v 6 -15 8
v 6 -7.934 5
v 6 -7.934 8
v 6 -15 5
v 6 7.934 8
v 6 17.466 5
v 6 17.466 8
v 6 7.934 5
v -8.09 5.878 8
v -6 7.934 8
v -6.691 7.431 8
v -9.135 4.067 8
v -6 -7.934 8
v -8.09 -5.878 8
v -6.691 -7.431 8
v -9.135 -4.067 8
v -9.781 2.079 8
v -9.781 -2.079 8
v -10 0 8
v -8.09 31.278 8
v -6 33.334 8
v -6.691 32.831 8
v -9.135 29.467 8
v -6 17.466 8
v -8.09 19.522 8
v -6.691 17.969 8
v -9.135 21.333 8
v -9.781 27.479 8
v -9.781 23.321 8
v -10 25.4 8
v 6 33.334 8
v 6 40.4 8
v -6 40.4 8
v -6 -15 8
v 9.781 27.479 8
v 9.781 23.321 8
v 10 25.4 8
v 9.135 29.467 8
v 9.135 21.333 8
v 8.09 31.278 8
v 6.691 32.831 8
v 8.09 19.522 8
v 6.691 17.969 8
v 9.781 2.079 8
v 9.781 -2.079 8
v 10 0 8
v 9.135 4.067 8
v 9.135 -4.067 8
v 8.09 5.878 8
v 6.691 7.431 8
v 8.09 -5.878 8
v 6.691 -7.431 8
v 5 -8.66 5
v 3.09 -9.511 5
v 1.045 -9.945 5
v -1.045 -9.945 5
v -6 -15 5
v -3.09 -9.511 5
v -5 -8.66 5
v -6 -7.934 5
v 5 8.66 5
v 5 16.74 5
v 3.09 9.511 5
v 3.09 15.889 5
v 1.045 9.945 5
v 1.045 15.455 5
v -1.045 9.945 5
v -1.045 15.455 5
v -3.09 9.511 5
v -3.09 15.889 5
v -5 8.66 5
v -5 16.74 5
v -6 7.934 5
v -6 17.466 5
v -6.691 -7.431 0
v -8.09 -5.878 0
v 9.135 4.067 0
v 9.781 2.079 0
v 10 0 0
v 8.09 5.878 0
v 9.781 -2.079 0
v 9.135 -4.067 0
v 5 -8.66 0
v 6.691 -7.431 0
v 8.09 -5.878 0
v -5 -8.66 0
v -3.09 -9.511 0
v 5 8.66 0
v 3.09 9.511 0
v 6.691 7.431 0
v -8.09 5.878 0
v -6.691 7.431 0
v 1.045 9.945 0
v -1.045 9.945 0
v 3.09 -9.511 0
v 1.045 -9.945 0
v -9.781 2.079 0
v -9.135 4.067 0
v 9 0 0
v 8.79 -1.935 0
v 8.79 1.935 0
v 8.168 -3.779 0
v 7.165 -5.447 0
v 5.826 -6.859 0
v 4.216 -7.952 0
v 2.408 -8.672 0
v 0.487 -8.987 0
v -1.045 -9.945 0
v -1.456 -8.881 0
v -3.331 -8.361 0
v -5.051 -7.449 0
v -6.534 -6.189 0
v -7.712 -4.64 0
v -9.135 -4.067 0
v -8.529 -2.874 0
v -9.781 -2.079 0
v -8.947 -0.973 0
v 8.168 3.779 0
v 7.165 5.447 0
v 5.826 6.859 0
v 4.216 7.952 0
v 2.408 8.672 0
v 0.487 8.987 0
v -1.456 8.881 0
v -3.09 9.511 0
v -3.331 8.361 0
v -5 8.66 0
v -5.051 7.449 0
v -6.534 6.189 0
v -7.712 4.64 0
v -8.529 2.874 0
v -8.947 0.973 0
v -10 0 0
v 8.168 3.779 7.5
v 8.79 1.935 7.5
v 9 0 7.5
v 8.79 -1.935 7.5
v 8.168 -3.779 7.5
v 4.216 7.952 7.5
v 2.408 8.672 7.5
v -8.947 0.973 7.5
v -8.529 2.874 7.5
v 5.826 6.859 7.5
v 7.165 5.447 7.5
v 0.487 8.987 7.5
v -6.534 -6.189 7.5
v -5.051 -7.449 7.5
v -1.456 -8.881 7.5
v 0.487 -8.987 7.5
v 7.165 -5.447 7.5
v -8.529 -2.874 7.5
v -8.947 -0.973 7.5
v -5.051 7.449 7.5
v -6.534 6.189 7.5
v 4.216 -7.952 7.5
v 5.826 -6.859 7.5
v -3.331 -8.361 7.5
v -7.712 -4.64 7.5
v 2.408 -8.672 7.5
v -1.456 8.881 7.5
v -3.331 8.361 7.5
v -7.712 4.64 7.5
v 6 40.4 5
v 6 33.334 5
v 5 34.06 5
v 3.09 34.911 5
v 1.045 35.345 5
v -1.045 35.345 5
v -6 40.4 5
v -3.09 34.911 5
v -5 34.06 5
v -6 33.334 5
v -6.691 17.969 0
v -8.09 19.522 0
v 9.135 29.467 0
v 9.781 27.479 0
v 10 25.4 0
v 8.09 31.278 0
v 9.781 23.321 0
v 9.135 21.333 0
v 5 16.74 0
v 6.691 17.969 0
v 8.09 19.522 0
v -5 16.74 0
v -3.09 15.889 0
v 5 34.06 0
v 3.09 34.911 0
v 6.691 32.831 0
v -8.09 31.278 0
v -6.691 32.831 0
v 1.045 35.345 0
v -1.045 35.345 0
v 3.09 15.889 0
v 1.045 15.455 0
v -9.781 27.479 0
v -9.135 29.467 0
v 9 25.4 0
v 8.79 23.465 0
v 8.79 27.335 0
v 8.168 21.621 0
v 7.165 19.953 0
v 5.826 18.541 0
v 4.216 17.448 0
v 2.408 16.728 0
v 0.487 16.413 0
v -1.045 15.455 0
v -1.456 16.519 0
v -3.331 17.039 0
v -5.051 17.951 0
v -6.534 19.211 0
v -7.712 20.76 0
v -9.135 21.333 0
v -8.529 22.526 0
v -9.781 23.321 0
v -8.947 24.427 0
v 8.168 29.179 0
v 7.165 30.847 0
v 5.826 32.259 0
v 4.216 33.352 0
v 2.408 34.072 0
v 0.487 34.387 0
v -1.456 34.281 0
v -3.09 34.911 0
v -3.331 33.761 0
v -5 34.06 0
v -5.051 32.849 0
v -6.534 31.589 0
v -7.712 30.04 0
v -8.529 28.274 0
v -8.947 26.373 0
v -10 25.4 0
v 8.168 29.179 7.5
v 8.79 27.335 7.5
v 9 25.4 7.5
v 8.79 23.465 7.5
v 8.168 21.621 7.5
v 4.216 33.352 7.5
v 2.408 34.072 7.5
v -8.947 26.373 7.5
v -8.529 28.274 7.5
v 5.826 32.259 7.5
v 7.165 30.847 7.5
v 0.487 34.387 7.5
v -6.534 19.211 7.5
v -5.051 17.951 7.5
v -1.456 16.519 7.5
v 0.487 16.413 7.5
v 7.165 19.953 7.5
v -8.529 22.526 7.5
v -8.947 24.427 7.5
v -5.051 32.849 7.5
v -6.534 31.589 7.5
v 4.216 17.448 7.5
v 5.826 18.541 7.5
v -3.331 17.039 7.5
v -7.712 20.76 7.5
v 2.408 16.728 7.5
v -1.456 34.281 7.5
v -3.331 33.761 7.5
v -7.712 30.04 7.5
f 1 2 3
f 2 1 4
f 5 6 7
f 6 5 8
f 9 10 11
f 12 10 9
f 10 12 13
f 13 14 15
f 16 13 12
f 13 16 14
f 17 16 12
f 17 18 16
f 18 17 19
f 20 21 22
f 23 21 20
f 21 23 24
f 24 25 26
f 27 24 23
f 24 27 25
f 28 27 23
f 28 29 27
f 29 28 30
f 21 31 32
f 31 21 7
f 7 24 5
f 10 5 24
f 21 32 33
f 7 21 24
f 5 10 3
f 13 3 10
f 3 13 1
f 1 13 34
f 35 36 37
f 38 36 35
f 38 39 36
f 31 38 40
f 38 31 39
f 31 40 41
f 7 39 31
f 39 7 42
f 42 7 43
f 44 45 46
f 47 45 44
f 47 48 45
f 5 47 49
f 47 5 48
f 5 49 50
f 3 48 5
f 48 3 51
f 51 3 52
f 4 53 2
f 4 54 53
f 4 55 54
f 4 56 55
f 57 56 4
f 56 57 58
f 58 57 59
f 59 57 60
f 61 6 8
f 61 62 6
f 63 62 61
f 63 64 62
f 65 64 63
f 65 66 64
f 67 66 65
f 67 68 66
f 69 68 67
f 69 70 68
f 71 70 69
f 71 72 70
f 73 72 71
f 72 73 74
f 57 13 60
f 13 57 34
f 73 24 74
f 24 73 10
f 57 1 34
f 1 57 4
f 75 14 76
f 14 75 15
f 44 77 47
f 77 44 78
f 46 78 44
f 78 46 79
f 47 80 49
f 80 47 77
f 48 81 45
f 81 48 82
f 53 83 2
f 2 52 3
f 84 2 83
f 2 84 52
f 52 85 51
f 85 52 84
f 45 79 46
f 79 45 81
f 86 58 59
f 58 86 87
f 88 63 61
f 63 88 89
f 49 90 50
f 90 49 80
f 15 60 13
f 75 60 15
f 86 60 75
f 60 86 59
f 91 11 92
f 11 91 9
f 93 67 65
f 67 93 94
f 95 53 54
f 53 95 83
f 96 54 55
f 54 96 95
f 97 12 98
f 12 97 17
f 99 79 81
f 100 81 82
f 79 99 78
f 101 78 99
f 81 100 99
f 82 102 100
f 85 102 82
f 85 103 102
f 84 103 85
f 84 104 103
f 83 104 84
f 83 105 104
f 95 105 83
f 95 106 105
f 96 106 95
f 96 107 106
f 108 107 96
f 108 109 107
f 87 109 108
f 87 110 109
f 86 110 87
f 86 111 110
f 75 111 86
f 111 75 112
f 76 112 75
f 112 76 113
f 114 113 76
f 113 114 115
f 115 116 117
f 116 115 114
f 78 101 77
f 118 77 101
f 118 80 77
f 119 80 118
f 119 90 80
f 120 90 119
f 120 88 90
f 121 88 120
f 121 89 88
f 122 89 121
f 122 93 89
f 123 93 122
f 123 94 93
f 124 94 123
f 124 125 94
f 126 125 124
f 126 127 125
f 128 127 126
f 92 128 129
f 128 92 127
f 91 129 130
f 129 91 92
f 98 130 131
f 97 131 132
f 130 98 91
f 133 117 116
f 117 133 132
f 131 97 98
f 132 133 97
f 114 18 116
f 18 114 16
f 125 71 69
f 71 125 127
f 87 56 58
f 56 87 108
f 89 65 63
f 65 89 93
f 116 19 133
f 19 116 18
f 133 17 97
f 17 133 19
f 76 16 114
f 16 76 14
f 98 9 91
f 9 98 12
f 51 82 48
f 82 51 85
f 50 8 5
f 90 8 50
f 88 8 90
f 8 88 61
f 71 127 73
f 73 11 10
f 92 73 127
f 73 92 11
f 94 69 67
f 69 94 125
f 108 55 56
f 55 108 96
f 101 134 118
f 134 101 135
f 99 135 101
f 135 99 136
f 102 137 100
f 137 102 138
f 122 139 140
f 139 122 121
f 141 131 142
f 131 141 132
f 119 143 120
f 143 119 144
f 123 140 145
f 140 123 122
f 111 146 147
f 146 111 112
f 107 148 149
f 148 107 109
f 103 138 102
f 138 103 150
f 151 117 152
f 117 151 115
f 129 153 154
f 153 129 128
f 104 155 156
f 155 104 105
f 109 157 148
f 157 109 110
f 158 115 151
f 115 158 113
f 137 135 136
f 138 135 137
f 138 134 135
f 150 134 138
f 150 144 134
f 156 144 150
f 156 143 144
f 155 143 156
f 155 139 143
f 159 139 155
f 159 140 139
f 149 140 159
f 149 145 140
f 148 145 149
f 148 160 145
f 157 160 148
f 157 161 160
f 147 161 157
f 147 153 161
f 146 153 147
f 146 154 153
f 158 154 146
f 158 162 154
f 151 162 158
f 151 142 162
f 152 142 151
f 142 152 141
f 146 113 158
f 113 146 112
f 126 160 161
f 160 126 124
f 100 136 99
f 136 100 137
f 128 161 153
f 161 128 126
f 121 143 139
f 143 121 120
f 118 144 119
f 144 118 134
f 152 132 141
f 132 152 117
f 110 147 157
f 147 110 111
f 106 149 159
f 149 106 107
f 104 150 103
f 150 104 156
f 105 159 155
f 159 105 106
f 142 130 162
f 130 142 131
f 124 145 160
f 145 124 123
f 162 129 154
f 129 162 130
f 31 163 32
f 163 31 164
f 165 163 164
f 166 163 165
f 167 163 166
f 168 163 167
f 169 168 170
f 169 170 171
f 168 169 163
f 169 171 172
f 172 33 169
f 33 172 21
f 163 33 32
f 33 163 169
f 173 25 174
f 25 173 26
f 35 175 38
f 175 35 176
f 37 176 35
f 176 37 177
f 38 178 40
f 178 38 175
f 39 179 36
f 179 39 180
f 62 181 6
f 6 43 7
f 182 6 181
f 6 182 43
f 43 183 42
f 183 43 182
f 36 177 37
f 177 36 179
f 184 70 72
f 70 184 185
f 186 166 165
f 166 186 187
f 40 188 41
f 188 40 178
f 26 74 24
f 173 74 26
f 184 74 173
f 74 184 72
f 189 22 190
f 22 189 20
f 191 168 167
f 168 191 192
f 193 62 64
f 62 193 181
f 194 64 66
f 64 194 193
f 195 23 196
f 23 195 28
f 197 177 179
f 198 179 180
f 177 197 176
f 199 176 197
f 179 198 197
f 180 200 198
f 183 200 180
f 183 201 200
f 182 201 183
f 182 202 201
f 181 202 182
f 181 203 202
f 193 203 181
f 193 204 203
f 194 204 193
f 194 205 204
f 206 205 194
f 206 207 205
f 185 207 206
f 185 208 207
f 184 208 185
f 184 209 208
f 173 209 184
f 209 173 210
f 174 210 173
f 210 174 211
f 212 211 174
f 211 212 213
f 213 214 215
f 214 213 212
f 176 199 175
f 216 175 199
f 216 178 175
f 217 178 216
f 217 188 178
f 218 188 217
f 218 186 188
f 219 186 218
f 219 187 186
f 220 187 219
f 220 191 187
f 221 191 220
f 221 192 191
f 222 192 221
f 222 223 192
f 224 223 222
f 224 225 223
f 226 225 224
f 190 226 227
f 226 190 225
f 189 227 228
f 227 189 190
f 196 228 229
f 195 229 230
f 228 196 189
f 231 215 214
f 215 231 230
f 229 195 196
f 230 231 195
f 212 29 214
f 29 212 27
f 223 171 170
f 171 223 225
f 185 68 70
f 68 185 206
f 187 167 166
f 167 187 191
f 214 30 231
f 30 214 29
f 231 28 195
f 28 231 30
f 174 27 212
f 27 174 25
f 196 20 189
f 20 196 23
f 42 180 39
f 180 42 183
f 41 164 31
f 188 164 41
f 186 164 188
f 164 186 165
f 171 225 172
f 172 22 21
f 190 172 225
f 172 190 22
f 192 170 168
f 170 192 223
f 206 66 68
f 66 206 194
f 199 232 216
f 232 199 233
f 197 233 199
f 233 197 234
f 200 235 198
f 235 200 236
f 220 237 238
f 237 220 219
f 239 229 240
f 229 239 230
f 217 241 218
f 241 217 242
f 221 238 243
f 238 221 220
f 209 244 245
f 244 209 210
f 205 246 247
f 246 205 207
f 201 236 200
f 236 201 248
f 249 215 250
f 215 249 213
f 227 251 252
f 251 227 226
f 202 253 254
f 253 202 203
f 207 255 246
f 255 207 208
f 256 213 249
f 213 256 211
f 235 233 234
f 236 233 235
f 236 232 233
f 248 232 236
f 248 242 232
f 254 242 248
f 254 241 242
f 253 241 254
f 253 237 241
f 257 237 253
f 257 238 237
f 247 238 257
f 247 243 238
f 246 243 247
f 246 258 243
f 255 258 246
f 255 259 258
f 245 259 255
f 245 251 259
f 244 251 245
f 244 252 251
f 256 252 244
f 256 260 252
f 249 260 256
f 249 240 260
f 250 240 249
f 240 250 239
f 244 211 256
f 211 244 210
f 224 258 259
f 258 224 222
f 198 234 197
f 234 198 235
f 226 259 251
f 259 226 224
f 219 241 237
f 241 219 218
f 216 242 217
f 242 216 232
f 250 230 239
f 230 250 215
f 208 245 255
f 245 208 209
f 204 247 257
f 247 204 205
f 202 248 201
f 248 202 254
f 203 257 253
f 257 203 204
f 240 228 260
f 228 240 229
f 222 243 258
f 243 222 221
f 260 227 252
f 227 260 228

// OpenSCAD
od = 20;
id = 18;
tab_x = 12;
tab_y = 1.5*od;
tab_h = 3;
oh=8;
ih=7.5;

hole_d = 25.4;

module solid_plug() {
translate([0, 0, -0.5*tab_h+oh]) cube([tab_x, tab_y, tab_h], center=true);
cylinder(d=od, h=oh);
}

module plug()
difference() {
solid_plug();
cylinder(d=id, h=ih);
}


module double_plug() {
  plug();
  translate([0, hole_d, 0]) plug();
}


double_plug();
